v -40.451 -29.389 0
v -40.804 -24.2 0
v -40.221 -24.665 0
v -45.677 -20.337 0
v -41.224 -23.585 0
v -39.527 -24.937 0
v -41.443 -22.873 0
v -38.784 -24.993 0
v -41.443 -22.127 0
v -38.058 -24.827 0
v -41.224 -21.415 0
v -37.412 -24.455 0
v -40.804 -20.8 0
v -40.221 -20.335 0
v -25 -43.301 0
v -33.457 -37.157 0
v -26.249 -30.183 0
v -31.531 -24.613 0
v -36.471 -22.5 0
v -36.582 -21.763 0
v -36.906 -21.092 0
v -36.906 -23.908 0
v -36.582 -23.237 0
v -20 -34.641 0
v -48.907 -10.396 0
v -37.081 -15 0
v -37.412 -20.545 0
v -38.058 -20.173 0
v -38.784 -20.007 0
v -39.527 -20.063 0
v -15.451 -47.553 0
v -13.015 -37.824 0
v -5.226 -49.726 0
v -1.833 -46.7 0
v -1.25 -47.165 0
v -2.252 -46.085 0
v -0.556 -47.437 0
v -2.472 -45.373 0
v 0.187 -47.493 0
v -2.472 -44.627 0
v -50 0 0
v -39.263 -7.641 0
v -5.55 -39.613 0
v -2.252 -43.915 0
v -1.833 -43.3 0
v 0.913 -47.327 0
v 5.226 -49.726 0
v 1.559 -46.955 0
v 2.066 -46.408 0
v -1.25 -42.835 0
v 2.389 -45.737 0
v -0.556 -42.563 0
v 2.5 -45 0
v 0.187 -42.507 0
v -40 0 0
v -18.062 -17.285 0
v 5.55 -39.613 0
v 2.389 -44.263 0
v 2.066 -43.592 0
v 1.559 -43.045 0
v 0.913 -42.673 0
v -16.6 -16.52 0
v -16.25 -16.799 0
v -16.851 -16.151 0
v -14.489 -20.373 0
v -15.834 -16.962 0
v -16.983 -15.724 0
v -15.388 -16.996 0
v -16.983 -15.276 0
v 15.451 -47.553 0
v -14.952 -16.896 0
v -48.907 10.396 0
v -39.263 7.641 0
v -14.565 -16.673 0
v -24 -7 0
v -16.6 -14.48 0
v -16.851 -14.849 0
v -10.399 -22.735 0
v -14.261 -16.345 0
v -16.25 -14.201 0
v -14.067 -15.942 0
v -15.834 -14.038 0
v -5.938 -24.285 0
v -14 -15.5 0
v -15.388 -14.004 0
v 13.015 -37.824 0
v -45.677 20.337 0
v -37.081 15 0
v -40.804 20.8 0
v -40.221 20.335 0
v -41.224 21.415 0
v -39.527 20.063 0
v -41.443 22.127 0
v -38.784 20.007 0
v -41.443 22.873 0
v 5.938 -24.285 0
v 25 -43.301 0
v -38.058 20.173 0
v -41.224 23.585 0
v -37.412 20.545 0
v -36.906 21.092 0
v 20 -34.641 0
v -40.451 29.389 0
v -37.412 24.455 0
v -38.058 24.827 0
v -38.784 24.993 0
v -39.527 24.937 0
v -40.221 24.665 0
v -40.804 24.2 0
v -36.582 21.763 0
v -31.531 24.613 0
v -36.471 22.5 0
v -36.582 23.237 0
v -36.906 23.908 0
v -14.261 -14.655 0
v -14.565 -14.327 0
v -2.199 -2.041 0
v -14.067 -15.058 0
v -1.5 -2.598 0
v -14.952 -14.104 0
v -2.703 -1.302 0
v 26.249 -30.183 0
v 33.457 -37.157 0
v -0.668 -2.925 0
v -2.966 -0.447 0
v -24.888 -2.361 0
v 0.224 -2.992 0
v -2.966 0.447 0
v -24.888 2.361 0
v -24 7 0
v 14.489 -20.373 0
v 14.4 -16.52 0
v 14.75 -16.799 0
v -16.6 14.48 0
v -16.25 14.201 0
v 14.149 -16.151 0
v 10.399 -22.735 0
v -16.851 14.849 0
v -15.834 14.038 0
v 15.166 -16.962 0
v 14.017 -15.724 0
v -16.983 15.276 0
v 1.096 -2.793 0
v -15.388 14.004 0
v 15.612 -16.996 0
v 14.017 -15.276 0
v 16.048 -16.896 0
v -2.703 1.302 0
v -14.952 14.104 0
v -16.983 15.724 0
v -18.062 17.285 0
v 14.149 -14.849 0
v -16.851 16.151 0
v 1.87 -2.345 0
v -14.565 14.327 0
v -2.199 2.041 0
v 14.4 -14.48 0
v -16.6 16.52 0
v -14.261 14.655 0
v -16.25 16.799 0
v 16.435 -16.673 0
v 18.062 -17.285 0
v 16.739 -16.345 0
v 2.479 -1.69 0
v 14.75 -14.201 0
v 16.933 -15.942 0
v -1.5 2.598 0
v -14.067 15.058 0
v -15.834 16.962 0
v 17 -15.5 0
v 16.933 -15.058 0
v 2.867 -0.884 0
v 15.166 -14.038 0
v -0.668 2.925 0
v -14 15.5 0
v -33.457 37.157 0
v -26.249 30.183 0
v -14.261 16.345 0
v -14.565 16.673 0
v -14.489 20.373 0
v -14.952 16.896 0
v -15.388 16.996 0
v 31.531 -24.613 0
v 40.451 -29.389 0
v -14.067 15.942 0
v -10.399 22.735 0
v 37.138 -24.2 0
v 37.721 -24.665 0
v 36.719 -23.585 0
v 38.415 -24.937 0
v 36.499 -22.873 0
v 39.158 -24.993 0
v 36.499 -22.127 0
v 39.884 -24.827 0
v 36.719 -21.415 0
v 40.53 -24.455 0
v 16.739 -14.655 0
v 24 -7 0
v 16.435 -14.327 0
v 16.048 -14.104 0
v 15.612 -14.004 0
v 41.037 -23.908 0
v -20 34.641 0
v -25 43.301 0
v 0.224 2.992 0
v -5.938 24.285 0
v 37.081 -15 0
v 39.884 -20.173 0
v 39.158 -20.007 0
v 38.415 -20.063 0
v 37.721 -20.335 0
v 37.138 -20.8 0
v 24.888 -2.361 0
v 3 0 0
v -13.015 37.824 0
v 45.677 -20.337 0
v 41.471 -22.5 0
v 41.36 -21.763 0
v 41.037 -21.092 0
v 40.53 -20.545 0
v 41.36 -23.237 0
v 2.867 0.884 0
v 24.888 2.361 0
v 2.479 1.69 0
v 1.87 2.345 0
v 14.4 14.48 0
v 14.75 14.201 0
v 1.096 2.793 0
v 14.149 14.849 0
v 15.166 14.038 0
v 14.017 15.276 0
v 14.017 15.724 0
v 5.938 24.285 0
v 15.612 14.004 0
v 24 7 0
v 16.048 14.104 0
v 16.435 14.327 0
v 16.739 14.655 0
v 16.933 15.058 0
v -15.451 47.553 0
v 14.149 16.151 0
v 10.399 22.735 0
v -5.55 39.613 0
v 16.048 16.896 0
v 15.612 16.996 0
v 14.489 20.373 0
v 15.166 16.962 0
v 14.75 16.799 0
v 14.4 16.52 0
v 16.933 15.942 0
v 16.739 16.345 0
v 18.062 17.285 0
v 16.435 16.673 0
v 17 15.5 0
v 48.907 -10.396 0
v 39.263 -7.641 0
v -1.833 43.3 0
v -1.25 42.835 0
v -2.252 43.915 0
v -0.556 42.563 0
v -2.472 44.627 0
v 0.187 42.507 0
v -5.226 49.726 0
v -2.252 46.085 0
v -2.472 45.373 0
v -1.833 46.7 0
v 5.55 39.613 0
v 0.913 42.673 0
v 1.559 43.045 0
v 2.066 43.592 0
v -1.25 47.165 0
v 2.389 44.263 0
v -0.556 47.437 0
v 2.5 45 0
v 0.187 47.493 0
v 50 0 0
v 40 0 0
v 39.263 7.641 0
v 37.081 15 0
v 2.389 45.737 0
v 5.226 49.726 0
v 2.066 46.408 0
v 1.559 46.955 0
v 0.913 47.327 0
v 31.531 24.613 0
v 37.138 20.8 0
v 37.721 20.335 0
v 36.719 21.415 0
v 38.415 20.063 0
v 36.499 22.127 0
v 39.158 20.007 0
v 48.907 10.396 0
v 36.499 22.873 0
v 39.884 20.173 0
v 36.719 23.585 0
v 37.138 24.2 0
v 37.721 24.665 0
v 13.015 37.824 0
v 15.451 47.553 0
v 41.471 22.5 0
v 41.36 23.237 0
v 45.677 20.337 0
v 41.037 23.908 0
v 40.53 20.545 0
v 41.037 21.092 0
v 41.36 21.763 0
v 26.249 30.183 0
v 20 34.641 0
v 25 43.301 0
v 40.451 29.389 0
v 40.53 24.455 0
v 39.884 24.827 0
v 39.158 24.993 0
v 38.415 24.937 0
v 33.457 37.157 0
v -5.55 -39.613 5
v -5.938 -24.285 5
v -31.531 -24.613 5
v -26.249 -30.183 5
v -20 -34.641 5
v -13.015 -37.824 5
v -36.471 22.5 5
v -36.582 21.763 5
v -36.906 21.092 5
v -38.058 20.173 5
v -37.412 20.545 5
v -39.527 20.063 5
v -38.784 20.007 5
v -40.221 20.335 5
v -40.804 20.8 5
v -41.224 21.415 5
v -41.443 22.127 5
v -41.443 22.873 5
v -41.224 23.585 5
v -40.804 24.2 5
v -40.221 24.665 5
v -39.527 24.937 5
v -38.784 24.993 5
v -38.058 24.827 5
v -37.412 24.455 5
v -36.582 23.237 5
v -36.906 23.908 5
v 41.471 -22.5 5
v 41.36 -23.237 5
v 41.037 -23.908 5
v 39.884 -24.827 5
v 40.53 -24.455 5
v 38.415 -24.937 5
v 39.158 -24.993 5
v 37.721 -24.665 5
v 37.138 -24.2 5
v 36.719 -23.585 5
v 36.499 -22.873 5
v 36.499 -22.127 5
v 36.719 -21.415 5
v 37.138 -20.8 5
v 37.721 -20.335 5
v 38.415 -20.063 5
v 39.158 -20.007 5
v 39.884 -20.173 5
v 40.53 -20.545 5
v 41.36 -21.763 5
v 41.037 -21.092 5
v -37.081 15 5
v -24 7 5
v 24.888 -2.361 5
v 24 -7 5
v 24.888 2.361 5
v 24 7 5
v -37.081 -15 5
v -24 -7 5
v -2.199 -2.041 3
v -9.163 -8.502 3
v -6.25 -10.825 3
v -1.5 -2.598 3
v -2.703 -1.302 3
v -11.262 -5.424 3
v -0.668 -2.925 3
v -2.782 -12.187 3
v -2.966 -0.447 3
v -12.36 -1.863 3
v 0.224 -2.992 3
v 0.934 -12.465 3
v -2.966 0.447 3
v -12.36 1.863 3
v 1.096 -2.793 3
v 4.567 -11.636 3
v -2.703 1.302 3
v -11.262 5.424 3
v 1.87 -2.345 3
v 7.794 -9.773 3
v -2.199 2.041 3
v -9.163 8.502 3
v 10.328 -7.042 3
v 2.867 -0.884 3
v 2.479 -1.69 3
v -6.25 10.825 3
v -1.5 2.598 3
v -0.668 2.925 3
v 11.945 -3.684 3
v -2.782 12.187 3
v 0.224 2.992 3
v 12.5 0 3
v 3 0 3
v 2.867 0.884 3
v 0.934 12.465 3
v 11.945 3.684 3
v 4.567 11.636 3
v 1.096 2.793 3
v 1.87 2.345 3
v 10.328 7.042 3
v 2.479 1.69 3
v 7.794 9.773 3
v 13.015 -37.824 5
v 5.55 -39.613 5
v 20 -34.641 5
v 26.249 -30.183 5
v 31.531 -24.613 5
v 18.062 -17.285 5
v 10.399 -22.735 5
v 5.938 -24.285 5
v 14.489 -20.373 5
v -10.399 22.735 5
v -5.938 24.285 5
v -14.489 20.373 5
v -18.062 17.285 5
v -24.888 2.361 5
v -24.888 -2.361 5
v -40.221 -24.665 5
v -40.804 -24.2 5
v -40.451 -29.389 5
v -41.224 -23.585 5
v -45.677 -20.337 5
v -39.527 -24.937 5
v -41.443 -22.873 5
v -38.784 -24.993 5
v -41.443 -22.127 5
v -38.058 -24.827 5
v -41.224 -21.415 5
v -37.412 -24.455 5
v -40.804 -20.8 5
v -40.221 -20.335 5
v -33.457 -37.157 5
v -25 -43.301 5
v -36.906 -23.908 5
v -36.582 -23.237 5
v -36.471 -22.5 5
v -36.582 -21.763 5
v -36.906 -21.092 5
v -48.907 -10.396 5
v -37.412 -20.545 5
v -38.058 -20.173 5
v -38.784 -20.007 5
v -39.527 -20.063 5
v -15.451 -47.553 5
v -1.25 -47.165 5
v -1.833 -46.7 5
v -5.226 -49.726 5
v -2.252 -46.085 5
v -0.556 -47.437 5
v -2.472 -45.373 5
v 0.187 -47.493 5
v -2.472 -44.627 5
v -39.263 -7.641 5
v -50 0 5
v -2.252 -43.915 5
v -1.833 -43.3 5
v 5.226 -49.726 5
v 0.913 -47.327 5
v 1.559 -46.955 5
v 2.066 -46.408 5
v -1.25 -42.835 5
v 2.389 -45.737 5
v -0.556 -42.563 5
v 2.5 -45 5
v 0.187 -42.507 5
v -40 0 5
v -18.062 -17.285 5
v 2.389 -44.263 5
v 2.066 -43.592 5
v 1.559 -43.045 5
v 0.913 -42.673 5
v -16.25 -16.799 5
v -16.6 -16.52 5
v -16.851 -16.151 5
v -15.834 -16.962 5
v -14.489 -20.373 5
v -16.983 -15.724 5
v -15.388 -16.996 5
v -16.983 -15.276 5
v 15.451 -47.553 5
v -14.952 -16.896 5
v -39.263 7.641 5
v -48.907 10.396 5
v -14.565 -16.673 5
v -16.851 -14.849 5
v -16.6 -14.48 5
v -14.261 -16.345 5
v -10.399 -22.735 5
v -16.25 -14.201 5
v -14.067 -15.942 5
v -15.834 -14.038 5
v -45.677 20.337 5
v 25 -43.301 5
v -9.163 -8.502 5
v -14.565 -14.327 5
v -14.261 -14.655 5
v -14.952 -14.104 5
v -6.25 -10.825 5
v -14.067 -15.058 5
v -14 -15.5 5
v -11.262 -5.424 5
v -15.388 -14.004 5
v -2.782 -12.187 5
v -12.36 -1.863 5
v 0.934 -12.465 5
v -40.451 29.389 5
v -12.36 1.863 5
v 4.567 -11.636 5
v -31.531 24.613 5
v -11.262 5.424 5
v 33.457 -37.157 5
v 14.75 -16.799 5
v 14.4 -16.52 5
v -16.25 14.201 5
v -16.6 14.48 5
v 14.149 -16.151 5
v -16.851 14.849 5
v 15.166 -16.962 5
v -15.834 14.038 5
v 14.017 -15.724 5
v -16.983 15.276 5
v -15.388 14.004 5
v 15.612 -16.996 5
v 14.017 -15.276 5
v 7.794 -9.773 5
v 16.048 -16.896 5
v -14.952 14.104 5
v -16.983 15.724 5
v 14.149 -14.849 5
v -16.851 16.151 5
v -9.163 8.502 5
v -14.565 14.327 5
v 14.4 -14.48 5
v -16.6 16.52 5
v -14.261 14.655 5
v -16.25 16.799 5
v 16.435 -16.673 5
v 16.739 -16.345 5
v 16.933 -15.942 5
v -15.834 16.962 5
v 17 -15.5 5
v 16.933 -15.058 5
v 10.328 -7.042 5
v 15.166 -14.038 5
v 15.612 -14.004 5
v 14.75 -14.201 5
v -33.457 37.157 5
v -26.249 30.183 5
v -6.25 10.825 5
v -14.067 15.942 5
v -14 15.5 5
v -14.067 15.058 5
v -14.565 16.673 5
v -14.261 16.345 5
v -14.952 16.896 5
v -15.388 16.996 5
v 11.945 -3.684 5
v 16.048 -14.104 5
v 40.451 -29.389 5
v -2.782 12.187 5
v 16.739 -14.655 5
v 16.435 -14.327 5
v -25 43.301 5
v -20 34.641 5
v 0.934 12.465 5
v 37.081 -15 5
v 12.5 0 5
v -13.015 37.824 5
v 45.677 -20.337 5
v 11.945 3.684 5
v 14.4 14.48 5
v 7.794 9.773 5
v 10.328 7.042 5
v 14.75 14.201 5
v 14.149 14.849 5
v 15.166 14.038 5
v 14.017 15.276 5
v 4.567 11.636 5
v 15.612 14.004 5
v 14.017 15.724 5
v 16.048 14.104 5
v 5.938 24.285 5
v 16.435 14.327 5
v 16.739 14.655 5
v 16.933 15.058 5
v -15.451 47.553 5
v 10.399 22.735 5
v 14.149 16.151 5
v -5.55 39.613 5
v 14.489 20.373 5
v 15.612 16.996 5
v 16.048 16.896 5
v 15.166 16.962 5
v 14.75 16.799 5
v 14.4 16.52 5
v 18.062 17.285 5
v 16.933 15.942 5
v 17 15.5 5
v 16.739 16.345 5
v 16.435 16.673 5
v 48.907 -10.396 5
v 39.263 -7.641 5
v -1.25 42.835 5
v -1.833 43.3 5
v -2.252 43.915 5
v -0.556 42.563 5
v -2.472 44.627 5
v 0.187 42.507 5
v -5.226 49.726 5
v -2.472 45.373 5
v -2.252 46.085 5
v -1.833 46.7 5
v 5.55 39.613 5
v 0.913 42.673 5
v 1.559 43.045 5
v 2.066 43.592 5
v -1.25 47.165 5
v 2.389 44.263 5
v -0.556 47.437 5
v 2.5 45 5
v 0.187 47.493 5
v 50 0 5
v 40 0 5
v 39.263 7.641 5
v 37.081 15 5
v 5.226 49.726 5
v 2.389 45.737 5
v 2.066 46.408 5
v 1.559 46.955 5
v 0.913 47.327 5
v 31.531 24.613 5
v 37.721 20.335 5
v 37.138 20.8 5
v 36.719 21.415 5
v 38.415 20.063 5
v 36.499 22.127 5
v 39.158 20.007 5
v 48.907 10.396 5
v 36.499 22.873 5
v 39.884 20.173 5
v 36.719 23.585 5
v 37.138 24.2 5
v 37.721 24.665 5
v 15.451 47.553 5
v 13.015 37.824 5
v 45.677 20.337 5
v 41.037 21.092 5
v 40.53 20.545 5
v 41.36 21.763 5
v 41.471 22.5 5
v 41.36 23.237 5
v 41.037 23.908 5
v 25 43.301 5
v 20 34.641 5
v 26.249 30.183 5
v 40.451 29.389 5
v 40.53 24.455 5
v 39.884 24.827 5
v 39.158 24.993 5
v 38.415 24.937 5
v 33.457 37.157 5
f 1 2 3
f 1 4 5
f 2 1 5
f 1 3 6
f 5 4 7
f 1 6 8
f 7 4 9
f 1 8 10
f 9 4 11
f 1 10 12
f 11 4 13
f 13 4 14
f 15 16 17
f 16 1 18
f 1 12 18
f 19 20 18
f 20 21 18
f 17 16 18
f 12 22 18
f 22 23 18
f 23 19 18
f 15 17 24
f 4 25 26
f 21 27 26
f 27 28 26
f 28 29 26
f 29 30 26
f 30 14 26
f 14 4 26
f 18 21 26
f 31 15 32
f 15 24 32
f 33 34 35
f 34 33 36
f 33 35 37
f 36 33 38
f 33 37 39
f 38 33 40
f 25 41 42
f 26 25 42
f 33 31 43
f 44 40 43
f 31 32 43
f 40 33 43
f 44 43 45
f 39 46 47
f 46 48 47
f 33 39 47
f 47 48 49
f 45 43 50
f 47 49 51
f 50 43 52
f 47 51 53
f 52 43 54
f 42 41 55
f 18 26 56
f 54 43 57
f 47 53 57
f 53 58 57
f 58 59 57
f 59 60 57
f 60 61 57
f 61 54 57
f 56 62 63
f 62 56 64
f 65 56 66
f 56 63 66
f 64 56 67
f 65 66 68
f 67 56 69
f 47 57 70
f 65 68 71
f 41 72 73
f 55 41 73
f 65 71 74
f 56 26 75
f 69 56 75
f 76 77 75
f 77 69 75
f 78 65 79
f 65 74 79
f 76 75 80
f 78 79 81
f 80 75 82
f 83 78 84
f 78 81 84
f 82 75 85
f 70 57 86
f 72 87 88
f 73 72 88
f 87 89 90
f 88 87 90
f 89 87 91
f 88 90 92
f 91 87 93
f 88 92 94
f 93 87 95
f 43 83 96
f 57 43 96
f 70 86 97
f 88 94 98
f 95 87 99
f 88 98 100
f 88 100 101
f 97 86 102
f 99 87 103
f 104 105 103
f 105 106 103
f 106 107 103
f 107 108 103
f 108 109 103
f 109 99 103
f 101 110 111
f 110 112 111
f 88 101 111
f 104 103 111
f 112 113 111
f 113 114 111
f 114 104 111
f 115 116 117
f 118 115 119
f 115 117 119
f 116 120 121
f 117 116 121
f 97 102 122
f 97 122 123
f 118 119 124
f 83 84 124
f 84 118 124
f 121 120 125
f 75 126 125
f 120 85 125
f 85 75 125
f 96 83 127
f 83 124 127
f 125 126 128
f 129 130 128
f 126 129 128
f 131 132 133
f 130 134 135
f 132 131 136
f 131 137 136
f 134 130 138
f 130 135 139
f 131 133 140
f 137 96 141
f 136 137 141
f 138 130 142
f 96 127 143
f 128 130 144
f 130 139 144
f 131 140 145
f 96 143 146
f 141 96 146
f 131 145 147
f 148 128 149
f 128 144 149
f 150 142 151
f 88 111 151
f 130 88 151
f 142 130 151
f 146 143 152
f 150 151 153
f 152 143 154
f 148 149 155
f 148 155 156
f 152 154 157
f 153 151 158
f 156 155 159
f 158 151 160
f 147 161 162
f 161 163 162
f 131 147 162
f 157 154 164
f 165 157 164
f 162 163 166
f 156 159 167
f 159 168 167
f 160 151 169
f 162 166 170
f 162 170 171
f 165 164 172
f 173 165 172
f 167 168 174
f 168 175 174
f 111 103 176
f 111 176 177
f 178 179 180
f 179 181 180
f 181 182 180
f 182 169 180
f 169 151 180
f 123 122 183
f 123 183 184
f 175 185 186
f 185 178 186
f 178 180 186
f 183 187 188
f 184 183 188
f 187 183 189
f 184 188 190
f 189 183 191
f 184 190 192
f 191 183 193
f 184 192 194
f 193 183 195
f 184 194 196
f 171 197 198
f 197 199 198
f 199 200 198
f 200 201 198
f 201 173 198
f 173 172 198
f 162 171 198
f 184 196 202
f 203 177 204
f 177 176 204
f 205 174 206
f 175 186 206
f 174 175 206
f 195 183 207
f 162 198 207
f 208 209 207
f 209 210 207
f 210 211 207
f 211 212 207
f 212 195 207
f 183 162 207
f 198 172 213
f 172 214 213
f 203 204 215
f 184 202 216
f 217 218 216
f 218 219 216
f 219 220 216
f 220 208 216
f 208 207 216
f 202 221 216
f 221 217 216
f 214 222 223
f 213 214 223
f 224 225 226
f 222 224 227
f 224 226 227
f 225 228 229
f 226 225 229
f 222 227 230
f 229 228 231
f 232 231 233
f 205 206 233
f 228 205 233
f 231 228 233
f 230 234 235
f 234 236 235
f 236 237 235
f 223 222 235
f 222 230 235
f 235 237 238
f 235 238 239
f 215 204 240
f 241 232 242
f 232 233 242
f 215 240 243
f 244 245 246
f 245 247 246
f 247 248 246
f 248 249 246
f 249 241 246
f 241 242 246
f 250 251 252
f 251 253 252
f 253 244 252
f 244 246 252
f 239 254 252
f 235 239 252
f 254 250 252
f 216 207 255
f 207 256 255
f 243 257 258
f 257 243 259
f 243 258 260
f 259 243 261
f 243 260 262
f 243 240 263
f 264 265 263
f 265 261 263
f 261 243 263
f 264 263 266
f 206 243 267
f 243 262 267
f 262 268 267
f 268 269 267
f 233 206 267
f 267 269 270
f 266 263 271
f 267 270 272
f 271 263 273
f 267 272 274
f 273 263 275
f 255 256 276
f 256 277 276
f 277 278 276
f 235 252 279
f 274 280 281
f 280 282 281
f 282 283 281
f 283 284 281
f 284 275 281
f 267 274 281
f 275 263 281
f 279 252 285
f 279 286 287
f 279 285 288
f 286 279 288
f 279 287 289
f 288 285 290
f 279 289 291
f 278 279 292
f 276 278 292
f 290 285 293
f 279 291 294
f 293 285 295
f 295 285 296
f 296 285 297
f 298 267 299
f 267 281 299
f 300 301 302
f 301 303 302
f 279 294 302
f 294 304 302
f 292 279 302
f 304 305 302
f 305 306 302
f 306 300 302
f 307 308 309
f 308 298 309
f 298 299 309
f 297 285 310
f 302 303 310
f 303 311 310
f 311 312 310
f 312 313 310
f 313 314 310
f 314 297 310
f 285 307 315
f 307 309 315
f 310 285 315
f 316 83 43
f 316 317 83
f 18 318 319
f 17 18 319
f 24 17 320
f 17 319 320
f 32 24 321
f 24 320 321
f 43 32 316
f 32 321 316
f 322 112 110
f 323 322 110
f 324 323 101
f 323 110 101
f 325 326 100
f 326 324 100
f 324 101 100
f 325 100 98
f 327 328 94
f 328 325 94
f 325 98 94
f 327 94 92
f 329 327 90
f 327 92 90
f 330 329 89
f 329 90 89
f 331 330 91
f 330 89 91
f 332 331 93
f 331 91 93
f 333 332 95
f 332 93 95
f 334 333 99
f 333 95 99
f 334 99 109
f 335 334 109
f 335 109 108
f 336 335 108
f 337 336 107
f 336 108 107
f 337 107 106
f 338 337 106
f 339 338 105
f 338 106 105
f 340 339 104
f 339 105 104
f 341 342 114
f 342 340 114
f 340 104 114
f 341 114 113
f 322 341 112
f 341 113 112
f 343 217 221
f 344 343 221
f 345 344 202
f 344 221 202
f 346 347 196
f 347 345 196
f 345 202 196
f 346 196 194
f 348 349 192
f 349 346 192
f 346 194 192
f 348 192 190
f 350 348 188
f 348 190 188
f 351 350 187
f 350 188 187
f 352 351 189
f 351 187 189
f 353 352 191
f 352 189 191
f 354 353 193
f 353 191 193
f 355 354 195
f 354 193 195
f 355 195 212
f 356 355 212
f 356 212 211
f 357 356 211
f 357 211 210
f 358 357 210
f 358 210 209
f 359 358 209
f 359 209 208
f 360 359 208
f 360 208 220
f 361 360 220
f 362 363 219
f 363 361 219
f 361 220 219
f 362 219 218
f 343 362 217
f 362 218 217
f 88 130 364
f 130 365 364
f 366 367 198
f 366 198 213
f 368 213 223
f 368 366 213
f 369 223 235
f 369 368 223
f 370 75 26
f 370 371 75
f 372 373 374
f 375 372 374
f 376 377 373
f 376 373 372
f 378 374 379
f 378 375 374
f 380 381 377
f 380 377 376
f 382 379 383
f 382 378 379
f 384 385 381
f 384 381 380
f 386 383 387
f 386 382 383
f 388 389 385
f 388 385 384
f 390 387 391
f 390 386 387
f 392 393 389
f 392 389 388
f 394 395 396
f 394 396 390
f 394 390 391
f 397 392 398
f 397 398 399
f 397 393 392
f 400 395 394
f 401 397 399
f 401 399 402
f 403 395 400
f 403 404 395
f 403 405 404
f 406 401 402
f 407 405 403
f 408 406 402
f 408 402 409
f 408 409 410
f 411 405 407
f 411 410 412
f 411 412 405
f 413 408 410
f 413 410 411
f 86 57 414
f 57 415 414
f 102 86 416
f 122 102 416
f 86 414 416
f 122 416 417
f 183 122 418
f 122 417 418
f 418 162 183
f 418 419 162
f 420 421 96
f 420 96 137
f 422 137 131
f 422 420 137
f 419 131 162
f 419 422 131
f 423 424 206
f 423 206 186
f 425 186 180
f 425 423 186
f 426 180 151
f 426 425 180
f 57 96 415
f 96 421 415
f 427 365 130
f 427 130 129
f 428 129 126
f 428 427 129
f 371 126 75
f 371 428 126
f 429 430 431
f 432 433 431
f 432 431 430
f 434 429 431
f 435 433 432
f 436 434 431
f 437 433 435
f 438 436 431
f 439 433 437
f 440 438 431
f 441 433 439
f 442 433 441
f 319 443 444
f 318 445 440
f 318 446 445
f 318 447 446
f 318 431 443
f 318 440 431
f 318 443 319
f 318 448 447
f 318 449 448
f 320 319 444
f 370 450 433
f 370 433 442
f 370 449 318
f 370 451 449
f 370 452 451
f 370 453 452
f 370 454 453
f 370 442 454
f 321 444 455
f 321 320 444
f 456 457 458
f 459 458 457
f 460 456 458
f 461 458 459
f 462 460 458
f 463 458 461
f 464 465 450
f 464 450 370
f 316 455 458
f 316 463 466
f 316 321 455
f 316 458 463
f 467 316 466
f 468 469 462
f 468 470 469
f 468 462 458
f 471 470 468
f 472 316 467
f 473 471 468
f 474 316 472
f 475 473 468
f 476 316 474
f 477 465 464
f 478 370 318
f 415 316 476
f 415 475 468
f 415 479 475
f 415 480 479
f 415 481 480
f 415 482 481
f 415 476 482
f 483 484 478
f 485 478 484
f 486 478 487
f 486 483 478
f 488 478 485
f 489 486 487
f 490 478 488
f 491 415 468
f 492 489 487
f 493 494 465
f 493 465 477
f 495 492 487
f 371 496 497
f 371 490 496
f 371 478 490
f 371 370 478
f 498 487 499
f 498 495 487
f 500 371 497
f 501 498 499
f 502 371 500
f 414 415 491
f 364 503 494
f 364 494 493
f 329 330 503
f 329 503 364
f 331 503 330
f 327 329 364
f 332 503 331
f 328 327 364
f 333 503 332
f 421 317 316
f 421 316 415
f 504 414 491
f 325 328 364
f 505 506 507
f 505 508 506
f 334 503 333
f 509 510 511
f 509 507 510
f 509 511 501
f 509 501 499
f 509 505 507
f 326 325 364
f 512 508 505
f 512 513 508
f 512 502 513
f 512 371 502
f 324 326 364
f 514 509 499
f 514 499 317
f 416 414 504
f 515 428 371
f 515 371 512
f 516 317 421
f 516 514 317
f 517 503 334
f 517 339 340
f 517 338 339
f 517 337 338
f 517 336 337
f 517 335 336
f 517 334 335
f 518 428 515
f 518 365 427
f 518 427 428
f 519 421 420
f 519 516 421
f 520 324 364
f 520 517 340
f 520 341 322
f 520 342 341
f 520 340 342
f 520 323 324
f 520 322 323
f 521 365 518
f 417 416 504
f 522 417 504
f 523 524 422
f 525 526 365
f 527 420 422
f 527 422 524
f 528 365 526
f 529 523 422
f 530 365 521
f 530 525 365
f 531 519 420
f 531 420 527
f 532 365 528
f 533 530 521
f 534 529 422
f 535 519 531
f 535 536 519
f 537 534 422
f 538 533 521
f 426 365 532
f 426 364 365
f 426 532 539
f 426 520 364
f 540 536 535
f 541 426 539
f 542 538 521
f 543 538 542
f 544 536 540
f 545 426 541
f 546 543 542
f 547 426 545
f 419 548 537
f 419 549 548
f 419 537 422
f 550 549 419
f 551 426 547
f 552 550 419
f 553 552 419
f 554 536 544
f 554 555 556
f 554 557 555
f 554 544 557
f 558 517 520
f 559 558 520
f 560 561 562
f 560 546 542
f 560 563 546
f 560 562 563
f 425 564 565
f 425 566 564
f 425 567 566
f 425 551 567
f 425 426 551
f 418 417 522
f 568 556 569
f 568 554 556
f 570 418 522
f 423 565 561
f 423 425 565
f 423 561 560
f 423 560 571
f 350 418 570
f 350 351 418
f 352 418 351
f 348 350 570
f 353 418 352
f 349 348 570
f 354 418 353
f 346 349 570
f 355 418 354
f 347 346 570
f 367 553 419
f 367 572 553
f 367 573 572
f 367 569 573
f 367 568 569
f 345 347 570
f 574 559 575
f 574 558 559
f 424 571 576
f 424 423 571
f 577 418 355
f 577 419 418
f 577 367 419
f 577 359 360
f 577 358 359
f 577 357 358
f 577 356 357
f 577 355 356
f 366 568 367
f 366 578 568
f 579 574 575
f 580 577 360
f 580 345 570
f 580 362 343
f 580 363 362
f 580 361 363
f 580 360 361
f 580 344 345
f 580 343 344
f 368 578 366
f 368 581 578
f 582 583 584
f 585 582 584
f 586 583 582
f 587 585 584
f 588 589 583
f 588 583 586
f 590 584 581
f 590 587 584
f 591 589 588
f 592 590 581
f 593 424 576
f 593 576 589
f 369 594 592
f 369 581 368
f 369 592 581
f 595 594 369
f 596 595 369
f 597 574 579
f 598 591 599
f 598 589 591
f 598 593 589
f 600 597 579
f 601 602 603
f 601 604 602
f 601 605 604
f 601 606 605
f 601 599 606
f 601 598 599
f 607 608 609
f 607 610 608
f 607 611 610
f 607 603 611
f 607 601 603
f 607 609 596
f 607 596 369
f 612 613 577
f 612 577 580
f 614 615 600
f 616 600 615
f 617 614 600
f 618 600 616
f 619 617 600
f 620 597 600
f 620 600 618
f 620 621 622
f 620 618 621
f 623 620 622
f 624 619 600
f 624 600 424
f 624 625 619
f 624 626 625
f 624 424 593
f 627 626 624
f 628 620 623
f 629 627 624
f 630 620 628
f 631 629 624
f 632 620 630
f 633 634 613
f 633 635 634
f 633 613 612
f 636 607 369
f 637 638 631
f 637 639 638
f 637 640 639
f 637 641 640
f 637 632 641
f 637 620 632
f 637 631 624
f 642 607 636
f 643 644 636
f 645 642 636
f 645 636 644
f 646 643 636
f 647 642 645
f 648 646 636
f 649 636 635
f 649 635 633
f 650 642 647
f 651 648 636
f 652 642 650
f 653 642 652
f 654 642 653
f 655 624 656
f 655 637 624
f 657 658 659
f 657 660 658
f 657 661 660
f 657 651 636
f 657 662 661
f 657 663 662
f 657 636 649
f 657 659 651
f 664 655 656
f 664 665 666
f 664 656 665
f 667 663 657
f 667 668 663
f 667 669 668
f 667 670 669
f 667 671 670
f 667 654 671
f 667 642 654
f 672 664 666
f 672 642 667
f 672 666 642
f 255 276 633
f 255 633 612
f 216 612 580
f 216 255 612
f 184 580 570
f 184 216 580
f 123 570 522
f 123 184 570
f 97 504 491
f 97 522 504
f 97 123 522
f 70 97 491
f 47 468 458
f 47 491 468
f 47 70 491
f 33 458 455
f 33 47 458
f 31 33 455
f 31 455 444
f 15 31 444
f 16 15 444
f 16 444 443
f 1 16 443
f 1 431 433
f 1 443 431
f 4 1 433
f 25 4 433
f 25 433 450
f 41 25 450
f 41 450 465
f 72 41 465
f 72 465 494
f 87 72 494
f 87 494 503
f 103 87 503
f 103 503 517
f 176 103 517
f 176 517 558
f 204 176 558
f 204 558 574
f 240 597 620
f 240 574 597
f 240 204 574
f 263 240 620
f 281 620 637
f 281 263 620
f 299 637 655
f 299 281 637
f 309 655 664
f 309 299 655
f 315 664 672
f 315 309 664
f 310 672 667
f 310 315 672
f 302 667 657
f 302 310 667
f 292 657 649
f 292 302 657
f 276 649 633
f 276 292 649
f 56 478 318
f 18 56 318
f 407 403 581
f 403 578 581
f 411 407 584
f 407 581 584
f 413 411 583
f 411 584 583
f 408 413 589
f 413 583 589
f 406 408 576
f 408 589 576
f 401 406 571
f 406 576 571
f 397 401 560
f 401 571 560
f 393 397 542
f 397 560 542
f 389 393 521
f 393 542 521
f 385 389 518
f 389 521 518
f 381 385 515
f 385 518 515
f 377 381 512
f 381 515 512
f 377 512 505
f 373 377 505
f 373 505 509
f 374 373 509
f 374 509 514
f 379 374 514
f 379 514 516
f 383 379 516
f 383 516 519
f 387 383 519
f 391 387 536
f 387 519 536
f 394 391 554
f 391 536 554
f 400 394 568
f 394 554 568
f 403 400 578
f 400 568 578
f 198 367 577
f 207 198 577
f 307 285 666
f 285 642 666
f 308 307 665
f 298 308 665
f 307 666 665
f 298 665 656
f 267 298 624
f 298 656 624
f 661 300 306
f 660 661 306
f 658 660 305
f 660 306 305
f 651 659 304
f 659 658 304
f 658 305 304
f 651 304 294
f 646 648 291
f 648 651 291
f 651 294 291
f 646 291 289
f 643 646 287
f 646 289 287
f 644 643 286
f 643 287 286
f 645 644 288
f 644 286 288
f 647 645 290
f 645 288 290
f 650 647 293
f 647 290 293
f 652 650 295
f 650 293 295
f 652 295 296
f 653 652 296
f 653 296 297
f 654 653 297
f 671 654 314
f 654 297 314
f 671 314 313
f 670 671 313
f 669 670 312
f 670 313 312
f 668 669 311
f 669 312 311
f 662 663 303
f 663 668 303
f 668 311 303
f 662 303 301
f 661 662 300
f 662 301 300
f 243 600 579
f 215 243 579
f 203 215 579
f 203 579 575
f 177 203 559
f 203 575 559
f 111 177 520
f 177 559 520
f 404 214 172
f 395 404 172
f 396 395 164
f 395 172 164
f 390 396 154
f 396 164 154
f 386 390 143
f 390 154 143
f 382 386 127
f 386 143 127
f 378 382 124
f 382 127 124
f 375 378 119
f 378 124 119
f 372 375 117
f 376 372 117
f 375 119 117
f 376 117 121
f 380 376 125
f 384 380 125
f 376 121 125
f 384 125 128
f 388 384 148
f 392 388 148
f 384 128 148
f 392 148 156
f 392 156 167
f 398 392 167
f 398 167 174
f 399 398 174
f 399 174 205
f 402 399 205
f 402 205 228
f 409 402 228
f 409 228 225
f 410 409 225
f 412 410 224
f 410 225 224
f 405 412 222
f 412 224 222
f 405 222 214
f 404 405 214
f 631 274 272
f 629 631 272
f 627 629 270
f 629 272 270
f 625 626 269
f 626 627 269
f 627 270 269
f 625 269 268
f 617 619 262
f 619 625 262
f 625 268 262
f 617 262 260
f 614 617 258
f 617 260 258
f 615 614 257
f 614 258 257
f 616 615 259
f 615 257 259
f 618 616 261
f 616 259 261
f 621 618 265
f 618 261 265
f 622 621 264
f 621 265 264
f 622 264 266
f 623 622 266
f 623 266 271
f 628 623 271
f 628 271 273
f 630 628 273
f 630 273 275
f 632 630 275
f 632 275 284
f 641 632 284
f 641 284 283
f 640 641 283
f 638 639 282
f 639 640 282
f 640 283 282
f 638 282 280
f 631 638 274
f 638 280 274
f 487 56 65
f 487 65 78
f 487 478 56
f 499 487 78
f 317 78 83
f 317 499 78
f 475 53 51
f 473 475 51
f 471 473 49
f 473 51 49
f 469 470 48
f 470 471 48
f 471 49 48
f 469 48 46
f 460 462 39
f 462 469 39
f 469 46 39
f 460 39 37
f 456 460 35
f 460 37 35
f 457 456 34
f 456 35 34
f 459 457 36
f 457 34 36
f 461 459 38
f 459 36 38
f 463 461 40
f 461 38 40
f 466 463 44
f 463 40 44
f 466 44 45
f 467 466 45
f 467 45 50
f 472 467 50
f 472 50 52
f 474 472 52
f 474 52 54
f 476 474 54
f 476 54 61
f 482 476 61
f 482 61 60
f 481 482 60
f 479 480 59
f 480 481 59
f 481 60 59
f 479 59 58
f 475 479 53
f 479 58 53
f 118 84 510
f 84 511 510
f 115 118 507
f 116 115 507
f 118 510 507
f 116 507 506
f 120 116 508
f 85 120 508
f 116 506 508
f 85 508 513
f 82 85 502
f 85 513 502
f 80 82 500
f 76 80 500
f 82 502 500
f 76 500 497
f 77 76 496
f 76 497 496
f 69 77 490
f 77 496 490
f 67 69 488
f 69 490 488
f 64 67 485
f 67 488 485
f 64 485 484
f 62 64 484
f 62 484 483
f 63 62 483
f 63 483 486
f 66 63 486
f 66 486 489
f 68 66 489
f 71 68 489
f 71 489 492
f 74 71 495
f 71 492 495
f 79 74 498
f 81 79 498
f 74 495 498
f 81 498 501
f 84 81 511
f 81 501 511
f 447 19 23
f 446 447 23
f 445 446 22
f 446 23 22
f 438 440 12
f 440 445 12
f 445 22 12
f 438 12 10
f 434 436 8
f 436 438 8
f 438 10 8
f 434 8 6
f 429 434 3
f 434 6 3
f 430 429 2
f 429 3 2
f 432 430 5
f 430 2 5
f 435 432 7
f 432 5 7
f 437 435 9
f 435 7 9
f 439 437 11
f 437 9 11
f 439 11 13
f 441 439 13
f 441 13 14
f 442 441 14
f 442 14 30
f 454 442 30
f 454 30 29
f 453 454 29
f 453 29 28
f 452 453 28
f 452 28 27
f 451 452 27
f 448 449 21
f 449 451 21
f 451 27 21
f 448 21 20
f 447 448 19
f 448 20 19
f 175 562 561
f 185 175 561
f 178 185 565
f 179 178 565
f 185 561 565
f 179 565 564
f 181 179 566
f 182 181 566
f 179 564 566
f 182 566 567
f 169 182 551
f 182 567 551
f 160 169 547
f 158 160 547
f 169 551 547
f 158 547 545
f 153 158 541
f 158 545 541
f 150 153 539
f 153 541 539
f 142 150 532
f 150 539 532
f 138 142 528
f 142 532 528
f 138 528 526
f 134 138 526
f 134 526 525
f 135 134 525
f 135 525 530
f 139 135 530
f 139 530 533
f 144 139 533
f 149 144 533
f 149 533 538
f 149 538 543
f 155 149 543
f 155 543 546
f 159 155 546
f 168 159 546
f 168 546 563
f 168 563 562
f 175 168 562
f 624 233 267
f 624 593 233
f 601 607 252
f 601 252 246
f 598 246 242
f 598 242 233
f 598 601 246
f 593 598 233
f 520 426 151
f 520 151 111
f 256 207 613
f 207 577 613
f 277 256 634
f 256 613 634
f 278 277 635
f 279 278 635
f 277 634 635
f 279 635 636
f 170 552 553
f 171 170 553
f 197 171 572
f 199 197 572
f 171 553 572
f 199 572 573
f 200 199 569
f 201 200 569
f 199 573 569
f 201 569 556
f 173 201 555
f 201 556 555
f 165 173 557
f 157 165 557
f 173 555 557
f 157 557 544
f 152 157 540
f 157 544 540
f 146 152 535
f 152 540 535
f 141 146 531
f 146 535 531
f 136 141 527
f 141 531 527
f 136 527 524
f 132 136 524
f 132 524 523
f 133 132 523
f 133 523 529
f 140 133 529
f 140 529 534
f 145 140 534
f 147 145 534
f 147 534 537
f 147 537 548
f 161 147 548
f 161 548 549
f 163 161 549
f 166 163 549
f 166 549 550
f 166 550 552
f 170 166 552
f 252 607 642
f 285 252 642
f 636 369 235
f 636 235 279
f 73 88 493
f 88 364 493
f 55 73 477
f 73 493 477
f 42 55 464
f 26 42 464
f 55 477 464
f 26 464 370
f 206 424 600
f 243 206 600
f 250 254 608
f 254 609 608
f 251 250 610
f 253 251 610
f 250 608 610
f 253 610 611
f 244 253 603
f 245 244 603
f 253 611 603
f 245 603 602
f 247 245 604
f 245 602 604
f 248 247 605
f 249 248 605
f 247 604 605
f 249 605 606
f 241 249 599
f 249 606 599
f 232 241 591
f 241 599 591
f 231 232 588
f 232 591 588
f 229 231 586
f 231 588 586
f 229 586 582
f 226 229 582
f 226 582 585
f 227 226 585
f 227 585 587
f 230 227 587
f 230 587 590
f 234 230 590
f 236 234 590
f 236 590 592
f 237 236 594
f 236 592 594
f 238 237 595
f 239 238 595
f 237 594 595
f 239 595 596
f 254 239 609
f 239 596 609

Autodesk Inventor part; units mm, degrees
ref_plane "YZ Plane" through (0, 0, 0) normal (1, 0, 0) x (0, 1, 0)
ref_plane "XZ Plane" through (0, 0, 0) normal (0, 1, 0) x (-1, 0, 0)
ref_plane "XY Plane" through (0, 0, 0) normal (0, 0, 1) x (1, 0, 0)
sketch "Sketch1" plane through (0, 0, 0) normal (0, 0, 1) x (1, 0, 0)
  circle A0 centre (0, 0) radius 50
  circle A1 centre (0, 0) radius 3
  circle A2 centre (0, 45) radius 2.5
  circle A3 centre (-38.9711, 22.5) radius 2.5
  circle A4 centre (-38.9711, -22.5) radius 2.5
  circle A5 centre (0, -45) radius 2.5
  circle A6 centre (38.9711, -22.5) radius 2.5
  circle A7 centre (38.9711, 22.5) radius 2.5
  dimension "d0" = 100
  dimension "d1" = 6
  dimension "d2" = 5
  dimension "d3" = 45
  dimension "d6" = 360
extrude "Extrusion1" add sketch "Sketch1" along normal blind 5
sketch "Sketch2" plane through (0, 0, 5) normal (0, 0, 1) x (1, 0, 0)
  circle A0 centre (0, 0) radius 12.5
  dimension "d10" = 25
extrude "Extrusion2" cut sketch "Sketch2" against normal blind 2
sketch "Sketch3" plane through (0, 0, 5) normal (0, 0, 1) x (1, 0, 0)
  circle A0 centre (0, 0) radius 3 projected
  circle A1 centre (0, 0) radius 25 construction
  circle A2 centre (0, 0) radius 40 construction
  line L0 (24, 7) -> (37.081, 15)
  line L1 (24, -7) -> (37.081, -15)
  line L2 (0, 0) -> (57.5693, 0) construction
  arc A3 (24, -7) -> (24, 7) centre (0, 0) ccw
  arc A4 (37.081, -15) -> (37.081, 15) centre (0, 0) ccw
  line L3 (5.9378, 24.2846) -> (5.5501, 39.6131)
  line L4 (18.0622, 17.2846) -> (31.5309, 24.6131)
  circle A5 centre (0, 0) radius 25 construction
  arc A6 (18.0622, 17.2846) -> (5.9378, 24.2846) centre (0, 0) ccw
  circle A7 centre (0, 0) radius 40 construction
  arc A8 (31.5309, 24.6131) -> (5.5501, 39.6131) centre (0, 0) ccw
  line L5 (-18.0622, 17.2846) -> (-31.5309, 24.6131)
  line L6 (-5.9378, 24.2846) -> (-5.5501, 39.6131)
  circle A9 centre (0, 0) radius 25 construction
  arc A10 (-5.9378, 24.2846) -> (-18.0622, 17.2846) centre (0, 0) ccw
  circle A11 centre (0, 0) radius 40 construction
  arc A12 (-5.5501, 39.6131) -> (-31.5309, 24.6131) centre (0, 0) ccw
  line L7 (-24, -7) -> (-37.081, -15)
  line L8 (-24, 7) -> (-37.081, 15)
  circle A13 centre (0, 0) radius 25 construction
  arc A14 (-24, 7) -> (-24, -7) centre (0, 0) ccw
  circle A15 centre (0, 0) radius 40 construction
  arc A16 (-37.081, 15) -> (-37.081, -15) centre (0, 0) ccw
  line L9 (-5.9378, -24.2846) -> (-5.5501, -39.6131)
  line L10 (-18.0622, -17.2846) -> (-31.5309, -24.6131)
  circle A17 centre (0, 0) radius 25 construction
  arc A18 (-18.0622, -17.2846) -> (-5.9378, -24.2846) centre (0, 0) ccw
  circle A19 centre (0, 0) radius 40 construction
  arc A20 (-31.5309, -24.6131) -> (-5.5501, -39.6131) centre (0, 0) ccw
  line L11 (18.0622, -17.2846) -> (31.5309, -24.6131)
  line L12 (5.9378, -24.2846) -> (5.5501, -39.6131)
  circle A21 centre (0, 0) radius 25 construction
  arc A22 (5.9378, -24.2846) -> (18.0622, -17.2846) centre (0, 0) ccw
  circle A23 centre (0, 0) radius 40 construction
  arc A24 (5.5501, -39.6131) -> (31.5309, -24.6131) centre (0, 0) ccw
  dimension "d13" = 50
  dimension "d14" = 80
  dimension "d15" = 15
  dimension "d16" = 7
  dimension "d19" = 360
extrude "Extrusion3" cut sketch "Sketch3" against normal through all contours L0 A4 L1 A3 | L3 A8 L4 A6 | L5 A12 L6 A10 | L7 A16 L8 A14 | L9 A20 L10 A18 | L11 A24 L12 A22
sketch "Sketch5" plane through (0, 0, 5) normal (0, 0, 1) x (1, 0, 0)
  line L0 (-15.5, -15.5) -> (15.5, -15.5) construction
  line L1 (15.5, -15.5) -> (15.5, 15.5) construction
  line L2 (15.5, 15.5) -> (-15.5, 15.5) construction
  line L3 (-15.5, 15.5) -> (-15.5, -15.5) construction
  line L4 (-15.5, -15.5) -> (15.5, 15.5) construction
  line L5 (15.5, -15.5) -> (-15.5, 15.5) construction
  circle A0 centre (-15.5, 15.5) radius 1.5
  circle A1 centre (15.5, 15.5) radius 1.5
  circle A2 centre (15.5, -15.5) radius 1.5
  circle A3 centre (-15.5, -15.5) radius 1.5
  point P0 (0, 0)
  dimension "d23" = 31
  dimension "d24" = 31
  dimension "d25" = 3
  dimension "d26" = 3
  dimension "d27" = 3
  dimension "d28" = 3
extrude "Extrusion4" cut sketch "Sketch5" against normal through all
equation "\"d29\" = d24"
properties part number "MC002" material "ABS Plastic"
